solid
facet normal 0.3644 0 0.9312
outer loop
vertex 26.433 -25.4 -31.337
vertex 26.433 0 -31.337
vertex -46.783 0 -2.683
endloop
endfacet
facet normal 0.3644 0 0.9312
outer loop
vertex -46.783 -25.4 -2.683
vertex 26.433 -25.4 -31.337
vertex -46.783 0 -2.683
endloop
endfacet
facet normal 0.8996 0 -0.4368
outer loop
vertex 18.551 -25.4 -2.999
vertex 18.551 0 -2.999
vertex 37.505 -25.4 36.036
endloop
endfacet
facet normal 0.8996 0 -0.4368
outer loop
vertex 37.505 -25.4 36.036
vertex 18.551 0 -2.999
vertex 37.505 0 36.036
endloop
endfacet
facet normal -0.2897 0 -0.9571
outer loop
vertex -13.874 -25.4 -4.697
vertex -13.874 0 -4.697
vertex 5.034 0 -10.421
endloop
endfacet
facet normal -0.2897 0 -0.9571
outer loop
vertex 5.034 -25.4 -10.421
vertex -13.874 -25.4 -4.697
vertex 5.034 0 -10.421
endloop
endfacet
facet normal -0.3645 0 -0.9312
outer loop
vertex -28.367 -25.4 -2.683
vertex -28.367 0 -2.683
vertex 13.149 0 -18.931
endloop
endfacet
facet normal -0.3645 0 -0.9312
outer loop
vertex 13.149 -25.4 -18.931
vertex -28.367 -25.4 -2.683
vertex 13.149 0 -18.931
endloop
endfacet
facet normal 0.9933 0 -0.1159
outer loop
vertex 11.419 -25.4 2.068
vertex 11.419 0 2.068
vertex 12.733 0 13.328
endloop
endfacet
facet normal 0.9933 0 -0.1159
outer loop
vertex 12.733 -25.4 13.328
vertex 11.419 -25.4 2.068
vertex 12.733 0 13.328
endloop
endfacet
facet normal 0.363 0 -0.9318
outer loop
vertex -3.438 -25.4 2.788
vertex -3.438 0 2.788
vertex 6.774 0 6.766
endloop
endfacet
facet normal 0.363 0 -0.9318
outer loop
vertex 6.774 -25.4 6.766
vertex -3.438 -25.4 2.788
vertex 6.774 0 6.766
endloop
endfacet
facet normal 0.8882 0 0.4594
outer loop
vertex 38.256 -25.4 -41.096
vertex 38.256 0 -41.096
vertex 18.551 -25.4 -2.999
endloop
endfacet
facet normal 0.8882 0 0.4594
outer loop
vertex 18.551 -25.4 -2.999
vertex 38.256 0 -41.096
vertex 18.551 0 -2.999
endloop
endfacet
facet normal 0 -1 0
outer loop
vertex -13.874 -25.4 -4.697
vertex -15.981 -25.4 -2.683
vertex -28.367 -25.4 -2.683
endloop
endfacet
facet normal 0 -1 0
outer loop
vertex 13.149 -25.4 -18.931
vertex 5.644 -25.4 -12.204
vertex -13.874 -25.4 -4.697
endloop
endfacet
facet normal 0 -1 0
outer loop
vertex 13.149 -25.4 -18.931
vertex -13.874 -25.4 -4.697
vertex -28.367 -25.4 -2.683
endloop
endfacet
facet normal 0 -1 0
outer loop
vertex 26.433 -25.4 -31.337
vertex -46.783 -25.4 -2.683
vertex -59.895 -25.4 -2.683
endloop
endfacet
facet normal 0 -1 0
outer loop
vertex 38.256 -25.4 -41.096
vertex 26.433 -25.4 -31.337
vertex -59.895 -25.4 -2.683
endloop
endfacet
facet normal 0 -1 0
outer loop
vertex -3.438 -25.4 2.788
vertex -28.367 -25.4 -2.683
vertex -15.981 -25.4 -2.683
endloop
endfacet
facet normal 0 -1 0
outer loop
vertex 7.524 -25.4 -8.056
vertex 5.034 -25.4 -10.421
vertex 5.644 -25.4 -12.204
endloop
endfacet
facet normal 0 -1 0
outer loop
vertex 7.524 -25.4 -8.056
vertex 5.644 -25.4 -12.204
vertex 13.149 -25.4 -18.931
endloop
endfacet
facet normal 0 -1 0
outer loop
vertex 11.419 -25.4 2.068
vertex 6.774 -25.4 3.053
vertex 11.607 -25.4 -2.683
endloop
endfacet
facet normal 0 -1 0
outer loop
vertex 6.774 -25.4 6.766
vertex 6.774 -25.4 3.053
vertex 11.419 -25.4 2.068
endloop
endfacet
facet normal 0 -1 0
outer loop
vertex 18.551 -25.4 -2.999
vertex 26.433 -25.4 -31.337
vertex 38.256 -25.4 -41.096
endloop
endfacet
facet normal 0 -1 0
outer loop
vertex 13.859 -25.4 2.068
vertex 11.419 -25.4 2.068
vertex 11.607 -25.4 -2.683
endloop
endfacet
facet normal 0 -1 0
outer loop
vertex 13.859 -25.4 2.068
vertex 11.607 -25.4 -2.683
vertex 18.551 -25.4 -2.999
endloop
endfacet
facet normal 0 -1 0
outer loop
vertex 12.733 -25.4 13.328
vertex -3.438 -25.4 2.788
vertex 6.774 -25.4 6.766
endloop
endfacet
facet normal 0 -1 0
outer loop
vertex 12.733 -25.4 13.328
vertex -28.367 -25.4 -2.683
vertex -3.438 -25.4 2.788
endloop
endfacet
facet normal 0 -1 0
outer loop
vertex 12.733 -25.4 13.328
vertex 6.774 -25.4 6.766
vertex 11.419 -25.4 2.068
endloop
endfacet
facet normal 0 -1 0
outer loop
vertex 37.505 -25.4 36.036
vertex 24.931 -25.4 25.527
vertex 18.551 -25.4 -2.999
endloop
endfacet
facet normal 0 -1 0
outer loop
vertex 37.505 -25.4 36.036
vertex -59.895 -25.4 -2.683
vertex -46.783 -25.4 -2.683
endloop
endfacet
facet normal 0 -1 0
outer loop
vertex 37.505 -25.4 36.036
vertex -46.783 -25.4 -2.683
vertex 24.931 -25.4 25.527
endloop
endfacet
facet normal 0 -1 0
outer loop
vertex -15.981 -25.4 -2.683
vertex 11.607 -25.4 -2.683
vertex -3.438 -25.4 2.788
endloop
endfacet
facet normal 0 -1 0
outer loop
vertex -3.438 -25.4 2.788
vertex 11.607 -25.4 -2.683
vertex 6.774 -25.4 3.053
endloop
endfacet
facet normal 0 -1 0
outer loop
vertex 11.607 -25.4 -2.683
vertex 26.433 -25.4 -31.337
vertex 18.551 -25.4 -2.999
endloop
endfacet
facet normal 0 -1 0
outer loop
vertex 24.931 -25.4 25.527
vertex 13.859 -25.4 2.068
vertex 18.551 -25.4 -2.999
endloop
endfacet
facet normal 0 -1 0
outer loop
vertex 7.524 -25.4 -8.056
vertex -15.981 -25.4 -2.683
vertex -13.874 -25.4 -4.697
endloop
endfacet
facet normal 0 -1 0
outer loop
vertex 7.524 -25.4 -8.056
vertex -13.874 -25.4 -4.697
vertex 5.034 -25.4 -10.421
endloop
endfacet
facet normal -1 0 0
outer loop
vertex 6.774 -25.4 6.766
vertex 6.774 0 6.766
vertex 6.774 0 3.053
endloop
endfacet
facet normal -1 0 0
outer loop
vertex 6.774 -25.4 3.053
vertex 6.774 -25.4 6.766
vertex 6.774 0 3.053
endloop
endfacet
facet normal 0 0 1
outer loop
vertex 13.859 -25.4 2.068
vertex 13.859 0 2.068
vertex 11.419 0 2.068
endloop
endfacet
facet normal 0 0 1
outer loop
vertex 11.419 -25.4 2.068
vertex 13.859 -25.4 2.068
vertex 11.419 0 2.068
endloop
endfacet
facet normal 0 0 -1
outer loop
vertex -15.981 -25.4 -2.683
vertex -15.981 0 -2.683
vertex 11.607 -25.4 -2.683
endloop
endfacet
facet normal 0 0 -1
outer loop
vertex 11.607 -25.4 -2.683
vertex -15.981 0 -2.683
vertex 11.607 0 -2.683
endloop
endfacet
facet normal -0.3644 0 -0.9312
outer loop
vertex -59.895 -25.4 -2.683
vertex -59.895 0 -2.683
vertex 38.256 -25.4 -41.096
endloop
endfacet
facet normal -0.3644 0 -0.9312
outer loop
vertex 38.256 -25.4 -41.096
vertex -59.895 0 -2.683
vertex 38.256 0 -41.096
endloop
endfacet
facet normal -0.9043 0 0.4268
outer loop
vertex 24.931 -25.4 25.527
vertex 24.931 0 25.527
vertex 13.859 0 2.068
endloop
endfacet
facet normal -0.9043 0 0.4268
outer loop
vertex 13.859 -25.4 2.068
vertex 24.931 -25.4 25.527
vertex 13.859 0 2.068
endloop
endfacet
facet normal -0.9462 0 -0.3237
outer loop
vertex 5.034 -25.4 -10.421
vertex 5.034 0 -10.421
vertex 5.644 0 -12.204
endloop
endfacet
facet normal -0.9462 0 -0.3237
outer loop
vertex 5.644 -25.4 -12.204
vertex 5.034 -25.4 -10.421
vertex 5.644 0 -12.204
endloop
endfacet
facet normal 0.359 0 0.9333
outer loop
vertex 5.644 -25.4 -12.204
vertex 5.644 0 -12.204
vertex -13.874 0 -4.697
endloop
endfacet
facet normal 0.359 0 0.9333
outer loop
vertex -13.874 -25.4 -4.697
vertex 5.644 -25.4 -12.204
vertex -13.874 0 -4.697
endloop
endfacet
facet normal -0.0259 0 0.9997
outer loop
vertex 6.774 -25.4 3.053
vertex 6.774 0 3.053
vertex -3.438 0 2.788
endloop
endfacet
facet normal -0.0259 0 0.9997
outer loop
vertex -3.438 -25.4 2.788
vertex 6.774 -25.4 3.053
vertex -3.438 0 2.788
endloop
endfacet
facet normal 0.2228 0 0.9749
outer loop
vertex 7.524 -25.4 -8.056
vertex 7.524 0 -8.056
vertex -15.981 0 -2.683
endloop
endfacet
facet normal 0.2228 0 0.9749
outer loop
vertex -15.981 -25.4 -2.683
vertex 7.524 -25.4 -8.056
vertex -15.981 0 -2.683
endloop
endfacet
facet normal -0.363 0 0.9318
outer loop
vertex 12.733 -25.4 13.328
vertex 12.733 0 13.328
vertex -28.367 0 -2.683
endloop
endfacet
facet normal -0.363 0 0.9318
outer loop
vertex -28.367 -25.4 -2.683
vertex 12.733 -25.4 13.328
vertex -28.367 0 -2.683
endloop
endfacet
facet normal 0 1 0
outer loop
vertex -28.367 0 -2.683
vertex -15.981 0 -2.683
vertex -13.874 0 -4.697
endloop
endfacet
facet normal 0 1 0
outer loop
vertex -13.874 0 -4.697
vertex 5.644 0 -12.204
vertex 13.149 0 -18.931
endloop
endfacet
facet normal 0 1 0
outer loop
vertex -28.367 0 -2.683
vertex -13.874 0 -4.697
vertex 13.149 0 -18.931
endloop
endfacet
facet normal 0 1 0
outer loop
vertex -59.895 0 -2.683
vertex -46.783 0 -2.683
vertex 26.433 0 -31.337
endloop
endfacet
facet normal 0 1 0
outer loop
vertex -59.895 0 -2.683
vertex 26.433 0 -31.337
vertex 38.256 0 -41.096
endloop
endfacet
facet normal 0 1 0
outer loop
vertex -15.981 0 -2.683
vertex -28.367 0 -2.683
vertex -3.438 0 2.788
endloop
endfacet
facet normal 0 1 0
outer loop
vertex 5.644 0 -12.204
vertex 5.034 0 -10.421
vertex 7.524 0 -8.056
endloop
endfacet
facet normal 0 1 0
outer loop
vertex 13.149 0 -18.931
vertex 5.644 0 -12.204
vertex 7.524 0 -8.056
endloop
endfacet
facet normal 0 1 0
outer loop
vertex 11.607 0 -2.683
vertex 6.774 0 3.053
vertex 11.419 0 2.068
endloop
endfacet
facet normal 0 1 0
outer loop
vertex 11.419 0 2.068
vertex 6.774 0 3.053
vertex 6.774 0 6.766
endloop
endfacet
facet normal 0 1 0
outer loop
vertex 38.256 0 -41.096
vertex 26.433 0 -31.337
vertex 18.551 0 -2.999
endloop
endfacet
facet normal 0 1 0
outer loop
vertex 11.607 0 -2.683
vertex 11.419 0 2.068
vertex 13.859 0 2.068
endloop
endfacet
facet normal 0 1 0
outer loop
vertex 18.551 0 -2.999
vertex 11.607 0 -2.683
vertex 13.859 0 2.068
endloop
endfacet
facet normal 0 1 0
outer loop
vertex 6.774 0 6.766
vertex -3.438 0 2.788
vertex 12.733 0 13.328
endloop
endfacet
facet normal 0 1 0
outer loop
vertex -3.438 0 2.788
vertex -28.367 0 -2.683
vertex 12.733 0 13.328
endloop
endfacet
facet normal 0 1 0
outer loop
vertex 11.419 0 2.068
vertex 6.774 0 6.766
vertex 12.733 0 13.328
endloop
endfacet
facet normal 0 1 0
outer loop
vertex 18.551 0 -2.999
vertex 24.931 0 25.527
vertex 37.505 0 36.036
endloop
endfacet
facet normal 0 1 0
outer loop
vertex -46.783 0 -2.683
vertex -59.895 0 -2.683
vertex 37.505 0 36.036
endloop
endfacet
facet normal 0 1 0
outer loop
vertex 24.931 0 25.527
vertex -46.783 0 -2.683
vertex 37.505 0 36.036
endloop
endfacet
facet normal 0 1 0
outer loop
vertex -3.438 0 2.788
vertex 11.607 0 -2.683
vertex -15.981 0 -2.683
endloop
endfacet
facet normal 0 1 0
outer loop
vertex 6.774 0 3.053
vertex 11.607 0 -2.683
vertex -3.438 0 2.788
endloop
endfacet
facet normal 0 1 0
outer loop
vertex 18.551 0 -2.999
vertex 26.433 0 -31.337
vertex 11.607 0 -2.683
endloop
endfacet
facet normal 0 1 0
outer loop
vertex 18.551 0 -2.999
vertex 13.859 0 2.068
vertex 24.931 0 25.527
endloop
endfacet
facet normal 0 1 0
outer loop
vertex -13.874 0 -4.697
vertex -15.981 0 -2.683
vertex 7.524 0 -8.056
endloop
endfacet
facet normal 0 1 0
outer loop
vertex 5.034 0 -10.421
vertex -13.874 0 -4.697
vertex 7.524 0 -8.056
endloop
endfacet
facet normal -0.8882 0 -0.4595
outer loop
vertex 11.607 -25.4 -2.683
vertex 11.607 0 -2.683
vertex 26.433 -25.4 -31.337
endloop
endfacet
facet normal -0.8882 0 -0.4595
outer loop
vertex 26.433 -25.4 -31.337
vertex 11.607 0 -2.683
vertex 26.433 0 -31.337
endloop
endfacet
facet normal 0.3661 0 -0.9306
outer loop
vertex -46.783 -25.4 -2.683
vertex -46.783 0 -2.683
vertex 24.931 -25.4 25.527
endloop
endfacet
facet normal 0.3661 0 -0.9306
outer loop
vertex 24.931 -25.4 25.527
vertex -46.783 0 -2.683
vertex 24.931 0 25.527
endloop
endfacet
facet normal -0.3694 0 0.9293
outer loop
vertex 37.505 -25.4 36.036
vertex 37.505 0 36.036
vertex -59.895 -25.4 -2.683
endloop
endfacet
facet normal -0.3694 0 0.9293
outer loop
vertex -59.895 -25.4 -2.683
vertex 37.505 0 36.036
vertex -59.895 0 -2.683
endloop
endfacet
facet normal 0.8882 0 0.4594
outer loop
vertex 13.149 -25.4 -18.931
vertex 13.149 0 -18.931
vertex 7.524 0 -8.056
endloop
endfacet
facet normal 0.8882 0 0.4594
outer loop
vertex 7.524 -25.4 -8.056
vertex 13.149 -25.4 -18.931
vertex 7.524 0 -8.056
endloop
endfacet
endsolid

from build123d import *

# Parameters (mm, degrees)
F1_DEPTH = 25.4


with BuildPart() as f1:
    # F0 (on Front) → F1 (new body)
    with BuildSketch(Plane.XZ):
        Polygon((37.505187, 36.036089), (-59.895307, -2.682783), (38.255867, -41.096099), (18.550564, -2.999177), align=None)
        Polygon((5.644079, -12.203965), (-13.873555, -4.697184), (5.034152, -10.421105), align=None, mode=Mode.SUBTRACT)
        Polygon((11.606792, -2.682783), (26.432687, -31.33728), (-46.783395, -2.682783), (24.93133, 25.526594), (13.858826, 2.0679), (11.419123, 2.0679), (12.732809, 13.328073), (-28.366823, -2.682783), (13.1488, -18.930706), (7.523733, -8.055575), (-15.980633, -2.682783), align=None, mode=Mode.SUBTRACT)
        Polygon((6.774401, 3.053483), (-3.437838, 2.788078), (6.774401, 6.766378), align=None, mode=Mode.SUBTRACT)
    extrude(amount=F1_DEPTH)


solid = f1.part
